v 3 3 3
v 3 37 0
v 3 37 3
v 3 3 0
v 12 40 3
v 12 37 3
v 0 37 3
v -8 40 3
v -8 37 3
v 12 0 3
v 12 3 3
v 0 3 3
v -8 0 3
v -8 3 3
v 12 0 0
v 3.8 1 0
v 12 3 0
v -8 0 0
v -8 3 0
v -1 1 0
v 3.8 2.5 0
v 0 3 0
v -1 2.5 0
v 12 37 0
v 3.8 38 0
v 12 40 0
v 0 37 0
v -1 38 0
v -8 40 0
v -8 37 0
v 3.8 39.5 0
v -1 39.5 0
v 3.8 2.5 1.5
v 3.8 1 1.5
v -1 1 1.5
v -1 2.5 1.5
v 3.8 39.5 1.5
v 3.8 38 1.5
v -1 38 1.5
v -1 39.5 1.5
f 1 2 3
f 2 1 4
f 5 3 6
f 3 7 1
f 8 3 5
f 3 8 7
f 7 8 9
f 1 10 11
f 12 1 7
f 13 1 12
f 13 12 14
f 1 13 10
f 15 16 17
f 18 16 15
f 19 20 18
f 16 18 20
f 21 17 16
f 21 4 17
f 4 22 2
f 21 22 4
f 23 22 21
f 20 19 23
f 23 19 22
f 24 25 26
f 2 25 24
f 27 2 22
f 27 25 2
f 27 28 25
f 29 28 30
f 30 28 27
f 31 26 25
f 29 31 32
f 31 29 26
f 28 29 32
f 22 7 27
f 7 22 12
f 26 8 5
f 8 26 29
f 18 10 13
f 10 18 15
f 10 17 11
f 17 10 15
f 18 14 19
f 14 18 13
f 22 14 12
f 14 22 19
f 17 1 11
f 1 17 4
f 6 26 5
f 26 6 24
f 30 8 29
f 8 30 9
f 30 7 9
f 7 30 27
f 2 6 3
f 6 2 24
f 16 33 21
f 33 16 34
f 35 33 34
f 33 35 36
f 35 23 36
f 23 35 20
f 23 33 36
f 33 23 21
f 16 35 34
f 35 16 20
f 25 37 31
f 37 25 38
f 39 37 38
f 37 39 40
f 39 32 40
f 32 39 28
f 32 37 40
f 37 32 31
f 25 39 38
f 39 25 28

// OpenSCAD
//I
difference(){
union(){ 
 cube([3,40,3]);
  translate([-8,0,0]) cube([20,3,3]);
  translate([-8,37,0]) cube([20,3,3]);
}
translate([-1,1,0]) cube([4.8,1.5,1.5]);
translate([-1,38,0]) cube([4.8,1.5,1.5]);
}
